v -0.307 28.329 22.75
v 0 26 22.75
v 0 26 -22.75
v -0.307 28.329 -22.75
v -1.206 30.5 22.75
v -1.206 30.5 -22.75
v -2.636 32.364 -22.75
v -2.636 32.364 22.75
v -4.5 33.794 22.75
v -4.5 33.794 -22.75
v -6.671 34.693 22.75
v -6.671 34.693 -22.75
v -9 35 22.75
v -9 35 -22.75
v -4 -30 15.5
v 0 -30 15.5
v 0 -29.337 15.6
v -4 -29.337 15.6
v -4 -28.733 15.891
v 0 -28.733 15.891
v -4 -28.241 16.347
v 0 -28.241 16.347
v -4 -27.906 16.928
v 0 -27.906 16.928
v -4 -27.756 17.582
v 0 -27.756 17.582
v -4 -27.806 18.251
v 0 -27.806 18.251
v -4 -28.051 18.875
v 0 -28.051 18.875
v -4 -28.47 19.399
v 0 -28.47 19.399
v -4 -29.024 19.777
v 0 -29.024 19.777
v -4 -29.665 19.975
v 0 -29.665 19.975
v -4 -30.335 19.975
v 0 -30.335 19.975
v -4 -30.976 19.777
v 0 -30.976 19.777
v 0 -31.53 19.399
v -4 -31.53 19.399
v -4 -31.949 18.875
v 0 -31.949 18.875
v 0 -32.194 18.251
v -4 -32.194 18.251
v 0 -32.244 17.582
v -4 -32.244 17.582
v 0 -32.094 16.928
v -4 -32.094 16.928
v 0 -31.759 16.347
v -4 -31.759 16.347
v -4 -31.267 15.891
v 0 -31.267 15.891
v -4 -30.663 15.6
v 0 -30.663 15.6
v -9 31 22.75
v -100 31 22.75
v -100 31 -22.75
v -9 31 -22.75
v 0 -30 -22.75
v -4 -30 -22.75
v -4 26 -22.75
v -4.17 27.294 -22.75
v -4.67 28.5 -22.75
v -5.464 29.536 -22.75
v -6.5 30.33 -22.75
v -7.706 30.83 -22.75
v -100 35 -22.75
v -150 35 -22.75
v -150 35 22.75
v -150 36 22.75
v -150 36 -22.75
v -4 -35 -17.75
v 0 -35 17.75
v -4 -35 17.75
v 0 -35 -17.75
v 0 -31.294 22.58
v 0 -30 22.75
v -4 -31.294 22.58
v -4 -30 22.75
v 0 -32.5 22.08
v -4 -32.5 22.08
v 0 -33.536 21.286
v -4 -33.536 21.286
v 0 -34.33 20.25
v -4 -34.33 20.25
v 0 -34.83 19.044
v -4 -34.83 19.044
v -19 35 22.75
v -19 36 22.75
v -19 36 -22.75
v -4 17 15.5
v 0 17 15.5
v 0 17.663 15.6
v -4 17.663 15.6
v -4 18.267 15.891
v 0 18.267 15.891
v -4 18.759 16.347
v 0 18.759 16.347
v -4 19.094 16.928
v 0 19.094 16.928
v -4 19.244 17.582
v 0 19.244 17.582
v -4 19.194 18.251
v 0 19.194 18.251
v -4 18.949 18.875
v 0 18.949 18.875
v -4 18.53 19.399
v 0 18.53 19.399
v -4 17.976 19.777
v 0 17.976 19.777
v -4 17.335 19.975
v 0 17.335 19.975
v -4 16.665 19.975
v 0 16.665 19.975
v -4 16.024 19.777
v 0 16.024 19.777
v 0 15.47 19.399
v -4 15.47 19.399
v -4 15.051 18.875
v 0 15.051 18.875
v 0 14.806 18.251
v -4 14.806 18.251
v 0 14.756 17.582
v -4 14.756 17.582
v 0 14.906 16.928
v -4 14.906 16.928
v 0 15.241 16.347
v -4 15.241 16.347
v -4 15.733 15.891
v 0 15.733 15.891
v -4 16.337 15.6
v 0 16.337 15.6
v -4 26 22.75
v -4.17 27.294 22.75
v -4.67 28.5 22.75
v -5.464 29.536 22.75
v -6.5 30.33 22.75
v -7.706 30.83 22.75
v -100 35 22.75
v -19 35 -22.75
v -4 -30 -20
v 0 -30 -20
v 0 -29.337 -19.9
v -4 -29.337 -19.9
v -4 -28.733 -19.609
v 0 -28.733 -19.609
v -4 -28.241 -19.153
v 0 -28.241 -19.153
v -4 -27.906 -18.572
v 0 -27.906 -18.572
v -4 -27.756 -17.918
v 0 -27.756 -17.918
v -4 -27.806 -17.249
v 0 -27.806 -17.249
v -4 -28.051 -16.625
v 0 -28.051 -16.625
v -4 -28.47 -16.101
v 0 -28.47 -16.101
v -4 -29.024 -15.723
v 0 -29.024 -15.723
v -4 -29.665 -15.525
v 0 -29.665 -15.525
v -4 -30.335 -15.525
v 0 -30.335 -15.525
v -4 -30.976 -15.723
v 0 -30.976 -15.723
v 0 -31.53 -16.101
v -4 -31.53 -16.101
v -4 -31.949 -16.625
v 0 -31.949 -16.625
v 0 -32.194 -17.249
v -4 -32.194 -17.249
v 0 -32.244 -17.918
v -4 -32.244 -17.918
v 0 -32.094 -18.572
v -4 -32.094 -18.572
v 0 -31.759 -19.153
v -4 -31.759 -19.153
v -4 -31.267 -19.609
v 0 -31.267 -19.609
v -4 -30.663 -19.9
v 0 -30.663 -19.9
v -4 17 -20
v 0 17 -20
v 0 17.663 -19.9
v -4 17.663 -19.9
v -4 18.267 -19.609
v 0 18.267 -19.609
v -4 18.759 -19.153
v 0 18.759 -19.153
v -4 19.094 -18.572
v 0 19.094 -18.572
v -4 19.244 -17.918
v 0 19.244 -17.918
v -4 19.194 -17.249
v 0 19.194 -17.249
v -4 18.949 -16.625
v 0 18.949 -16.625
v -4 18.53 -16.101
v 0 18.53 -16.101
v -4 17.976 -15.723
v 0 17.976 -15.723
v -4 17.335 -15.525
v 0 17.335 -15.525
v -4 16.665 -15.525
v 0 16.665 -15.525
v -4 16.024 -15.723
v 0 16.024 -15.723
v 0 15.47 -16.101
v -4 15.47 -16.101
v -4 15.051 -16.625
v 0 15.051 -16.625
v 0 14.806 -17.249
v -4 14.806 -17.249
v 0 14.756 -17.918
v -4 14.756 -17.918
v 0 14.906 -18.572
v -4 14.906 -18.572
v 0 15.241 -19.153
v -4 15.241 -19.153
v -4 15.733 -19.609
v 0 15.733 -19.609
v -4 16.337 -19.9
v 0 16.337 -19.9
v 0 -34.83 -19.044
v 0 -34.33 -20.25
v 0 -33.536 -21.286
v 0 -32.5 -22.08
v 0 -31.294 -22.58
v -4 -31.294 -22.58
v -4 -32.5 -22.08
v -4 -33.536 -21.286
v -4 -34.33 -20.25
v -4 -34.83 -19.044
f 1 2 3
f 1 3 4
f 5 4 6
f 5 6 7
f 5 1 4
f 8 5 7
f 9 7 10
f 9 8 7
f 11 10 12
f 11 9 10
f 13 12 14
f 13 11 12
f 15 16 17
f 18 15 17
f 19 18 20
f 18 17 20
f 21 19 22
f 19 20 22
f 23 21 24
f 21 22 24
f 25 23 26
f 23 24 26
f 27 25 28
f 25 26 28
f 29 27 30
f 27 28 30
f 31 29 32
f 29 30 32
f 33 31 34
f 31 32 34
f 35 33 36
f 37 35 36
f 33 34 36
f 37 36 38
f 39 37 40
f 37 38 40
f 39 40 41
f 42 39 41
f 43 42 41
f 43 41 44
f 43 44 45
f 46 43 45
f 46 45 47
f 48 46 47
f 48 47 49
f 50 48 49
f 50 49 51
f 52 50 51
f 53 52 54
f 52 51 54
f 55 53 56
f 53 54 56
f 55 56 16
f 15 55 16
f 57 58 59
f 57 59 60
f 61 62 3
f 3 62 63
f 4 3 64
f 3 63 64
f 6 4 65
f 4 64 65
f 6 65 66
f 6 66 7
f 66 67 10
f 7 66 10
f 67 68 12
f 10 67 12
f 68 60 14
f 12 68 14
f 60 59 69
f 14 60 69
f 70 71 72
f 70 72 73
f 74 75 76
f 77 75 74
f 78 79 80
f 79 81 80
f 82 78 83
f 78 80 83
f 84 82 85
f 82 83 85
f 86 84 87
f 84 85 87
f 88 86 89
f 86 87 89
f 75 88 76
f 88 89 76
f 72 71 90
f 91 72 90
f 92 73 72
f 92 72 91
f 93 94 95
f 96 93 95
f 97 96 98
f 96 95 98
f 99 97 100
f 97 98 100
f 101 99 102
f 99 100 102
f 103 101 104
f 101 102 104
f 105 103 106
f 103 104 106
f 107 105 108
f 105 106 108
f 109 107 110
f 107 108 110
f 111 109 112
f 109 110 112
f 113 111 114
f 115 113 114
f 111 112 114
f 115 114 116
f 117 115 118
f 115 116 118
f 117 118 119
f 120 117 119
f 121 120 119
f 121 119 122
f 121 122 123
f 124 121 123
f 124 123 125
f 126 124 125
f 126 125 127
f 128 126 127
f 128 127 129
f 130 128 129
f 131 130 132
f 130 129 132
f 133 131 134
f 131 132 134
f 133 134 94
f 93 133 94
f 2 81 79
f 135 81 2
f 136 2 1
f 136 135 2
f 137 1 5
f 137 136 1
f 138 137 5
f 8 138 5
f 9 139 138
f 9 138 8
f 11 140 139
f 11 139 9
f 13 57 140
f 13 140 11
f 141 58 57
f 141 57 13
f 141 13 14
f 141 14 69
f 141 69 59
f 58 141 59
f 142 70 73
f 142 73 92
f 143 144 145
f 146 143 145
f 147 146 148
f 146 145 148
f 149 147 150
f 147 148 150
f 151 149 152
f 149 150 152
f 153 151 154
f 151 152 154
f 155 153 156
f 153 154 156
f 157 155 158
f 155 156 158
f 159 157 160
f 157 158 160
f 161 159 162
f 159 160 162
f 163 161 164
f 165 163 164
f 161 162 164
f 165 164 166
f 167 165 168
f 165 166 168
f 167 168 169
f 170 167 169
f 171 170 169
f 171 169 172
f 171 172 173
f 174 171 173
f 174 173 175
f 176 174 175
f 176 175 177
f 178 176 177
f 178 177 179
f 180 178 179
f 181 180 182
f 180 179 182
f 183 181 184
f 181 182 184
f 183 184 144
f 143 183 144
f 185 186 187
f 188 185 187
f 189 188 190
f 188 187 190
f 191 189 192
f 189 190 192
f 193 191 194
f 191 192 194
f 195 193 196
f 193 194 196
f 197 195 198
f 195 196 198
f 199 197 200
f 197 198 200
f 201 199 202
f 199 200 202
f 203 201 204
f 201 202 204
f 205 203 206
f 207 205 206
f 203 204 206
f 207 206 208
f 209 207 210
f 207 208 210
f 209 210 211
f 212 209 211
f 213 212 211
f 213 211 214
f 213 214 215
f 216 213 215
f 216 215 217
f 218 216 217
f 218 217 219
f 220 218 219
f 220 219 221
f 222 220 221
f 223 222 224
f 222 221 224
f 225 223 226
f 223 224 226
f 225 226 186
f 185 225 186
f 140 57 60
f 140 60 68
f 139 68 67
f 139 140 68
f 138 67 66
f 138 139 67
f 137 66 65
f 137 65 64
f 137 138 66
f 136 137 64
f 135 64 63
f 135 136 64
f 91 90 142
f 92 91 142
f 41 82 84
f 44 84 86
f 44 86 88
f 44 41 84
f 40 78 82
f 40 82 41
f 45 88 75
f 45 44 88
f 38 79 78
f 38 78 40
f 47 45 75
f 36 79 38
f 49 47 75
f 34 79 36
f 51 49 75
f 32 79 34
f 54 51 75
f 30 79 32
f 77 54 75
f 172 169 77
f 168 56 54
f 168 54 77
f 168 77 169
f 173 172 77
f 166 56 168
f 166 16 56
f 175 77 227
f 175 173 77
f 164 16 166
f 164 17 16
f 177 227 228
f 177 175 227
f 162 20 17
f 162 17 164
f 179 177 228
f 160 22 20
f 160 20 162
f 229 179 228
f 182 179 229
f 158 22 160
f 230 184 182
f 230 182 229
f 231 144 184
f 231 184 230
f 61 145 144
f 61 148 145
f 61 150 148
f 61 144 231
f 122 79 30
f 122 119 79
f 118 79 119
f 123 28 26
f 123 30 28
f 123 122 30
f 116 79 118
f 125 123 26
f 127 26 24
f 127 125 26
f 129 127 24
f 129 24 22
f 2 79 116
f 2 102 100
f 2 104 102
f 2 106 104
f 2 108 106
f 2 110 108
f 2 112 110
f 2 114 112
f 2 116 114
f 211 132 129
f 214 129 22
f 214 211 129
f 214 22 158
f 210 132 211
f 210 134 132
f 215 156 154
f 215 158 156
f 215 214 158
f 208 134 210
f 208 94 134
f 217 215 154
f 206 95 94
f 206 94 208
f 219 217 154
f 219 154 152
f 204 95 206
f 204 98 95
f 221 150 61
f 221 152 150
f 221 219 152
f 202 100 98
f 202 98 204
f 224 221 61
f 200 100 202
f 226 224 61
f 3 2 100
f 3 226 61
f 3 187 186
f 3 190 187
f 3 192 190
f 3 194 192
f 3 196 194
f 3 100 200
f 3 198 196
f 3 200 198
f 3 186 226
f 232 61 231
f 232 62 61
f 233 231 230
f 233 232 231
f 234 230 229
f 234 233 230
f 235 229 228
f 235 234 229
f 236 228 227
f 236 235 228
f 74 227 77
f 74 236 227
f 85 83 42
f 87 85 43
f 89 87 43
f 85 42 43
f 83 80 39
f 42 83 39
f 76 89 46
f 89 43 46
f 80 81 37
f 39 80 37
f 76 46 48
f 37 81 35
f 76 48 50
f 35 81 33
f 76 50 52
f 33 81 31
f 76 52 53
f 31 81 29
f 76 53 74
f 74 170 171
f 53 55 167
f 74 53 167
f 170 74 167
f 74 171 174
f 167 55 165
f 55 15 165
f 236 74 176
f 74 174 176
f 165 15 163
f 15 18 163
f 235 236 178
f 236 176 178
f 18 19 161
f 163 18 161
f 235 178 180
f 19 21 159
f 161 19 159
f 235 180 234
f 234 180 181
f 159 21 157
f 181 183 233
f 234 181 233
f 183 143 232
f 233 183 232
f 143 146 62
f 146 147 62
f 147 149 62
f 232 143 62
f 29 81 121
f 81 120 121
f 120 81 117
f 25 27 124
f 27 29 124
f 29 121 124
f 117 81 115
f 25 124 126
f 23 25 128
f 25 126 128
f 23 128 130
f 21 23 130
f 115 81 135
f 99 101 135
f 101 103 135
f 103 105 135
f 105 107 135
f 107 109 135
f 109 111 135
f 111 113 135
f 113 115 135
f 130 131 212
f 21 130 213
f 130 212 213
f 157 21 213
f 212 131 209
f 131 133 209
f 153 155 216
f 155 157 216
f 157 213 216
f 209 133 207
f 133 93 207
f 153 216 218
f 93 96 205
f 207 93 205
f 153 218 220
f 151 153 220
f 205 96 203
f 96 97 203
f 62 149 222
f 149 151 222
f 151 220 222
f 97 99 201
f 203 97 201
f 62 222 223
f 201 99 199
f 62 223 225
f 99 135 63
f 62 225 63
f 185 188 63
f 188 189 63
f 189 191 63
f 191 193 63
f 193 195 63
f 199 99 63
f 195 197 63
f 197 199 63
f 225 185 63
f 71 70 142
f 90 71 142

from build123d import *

# Parameters (mm, degrees)
SKETCH1_W                    = 45.5
SKETCH1_H                    = 70
SKETCH1_R                    = 2.25
BASE_FLANGE1_DEPTH           = 4
EDGE_FLANGE1_STRIP_W         = 26
EDGE_FLANGE1_STRIP_H         = 4
EDGE_FLANGE1_STRIP_CUT_DEPTH = 45.5
EDGE_FLANGE1_DEPTH           = 45.5
SKETCH9_W                    = 131
SKETCH9_H                    = 45.5
BOSS_EXTRUDE1_DEPTH          = 1
FILLET1_R                    = 5


# Sheet-metal steps are written as plain solids
with BuildPart() as part:
    # Sketch1 → Base-Flange1 (new body)
    with BuildSketch(Plane(origin=(0, 0, 0), x_dir=(0, 0, -1), z_dir=(1, 0, 0))):
        Rectangle(SKETCH1_W, SKETCH1_H)
        with Locations((-17.75, -30)):
            Circle(SKETCH1_R, mode=Mode.SUBTRACT)
        with Locations((17.75, -30)):
            Circle(SKETCH1_R, mode=Mode.SUBTRACT)
        with Locations((17.75, 17)):
            Circle(SKETCH1_R, mode=Mode.SUBTRACT)
        with Locations((-17.75, 17)):
            Circle(SKETCH1_R, mode=Mode.SUBTRACT)
    extrude(amount=-BASE_FLANGE1_DEPTH)

    # Edge-Flange1 strip (across the edge) → Edge-Flange1 strip cut (cut)
    with BuildSketch(Plane(origin=(-4, 35, 22.75), x_dir=(0, -1, 0), z_dir=(0, 0, -1))):
        with Locations((-4, -2)):
            Rectangle(EDGE_FLANGE1_STRIP_W, EDGE_FLANGE1_STRIP_H)
    extrude(amount=EDGE_FLANGE1_STRIP_CUT_DEPTH, mode=Mode.SUBTRACT)

    # Edge-Flange1 section (across the edge) → Edge-Flange1 (add)
    with BuildSketch(Plane(origin=(-4, 35, 22.75), x_dir=(0, -1, 0), z_dir=(0, 0, -1))):
        with BuildLine():
            Line((0, 5), (0, 96))
            Line((0, 96), (4, 96))
            Line((4, 96), (4, 5))
            ThreePointArc((4, 5), (5.464466094, 1.464466094), (9, 0))
            Line((9, 0), (9, -4))
            ThreePointArc((9, -4), (2.636038969, -1.363961031), (0, 5))
        make_face()
    extrude(amount=EDGE_FLANGE1_DEPTH)

    # Fillet1
    fillet1_edges = [part.edges().sort_by_distance(p)[0] for p in [
        (-2, -35, -22.75),
        (-2, -35, 22.75),
    ]]
    fillet(fillet1_edges, radius=FILLET1_R)


with BuildPart() as body_2:
    # Sketch9 → Boss-Extrude1 (new body)
    with BuildSketch(Plane(origin=(0, 35, 0), x_dir=(1, 0, 0), z_dir=(0, 1, 0))):
        with Locations((-84.5, 0)):
            Rectangle(SKETCH9_W, SKETCH9_H)
    extrude(amount=BOSS_EXTRUDE1_DEPTH)


solid = Compound([part.part, body_2.part])
